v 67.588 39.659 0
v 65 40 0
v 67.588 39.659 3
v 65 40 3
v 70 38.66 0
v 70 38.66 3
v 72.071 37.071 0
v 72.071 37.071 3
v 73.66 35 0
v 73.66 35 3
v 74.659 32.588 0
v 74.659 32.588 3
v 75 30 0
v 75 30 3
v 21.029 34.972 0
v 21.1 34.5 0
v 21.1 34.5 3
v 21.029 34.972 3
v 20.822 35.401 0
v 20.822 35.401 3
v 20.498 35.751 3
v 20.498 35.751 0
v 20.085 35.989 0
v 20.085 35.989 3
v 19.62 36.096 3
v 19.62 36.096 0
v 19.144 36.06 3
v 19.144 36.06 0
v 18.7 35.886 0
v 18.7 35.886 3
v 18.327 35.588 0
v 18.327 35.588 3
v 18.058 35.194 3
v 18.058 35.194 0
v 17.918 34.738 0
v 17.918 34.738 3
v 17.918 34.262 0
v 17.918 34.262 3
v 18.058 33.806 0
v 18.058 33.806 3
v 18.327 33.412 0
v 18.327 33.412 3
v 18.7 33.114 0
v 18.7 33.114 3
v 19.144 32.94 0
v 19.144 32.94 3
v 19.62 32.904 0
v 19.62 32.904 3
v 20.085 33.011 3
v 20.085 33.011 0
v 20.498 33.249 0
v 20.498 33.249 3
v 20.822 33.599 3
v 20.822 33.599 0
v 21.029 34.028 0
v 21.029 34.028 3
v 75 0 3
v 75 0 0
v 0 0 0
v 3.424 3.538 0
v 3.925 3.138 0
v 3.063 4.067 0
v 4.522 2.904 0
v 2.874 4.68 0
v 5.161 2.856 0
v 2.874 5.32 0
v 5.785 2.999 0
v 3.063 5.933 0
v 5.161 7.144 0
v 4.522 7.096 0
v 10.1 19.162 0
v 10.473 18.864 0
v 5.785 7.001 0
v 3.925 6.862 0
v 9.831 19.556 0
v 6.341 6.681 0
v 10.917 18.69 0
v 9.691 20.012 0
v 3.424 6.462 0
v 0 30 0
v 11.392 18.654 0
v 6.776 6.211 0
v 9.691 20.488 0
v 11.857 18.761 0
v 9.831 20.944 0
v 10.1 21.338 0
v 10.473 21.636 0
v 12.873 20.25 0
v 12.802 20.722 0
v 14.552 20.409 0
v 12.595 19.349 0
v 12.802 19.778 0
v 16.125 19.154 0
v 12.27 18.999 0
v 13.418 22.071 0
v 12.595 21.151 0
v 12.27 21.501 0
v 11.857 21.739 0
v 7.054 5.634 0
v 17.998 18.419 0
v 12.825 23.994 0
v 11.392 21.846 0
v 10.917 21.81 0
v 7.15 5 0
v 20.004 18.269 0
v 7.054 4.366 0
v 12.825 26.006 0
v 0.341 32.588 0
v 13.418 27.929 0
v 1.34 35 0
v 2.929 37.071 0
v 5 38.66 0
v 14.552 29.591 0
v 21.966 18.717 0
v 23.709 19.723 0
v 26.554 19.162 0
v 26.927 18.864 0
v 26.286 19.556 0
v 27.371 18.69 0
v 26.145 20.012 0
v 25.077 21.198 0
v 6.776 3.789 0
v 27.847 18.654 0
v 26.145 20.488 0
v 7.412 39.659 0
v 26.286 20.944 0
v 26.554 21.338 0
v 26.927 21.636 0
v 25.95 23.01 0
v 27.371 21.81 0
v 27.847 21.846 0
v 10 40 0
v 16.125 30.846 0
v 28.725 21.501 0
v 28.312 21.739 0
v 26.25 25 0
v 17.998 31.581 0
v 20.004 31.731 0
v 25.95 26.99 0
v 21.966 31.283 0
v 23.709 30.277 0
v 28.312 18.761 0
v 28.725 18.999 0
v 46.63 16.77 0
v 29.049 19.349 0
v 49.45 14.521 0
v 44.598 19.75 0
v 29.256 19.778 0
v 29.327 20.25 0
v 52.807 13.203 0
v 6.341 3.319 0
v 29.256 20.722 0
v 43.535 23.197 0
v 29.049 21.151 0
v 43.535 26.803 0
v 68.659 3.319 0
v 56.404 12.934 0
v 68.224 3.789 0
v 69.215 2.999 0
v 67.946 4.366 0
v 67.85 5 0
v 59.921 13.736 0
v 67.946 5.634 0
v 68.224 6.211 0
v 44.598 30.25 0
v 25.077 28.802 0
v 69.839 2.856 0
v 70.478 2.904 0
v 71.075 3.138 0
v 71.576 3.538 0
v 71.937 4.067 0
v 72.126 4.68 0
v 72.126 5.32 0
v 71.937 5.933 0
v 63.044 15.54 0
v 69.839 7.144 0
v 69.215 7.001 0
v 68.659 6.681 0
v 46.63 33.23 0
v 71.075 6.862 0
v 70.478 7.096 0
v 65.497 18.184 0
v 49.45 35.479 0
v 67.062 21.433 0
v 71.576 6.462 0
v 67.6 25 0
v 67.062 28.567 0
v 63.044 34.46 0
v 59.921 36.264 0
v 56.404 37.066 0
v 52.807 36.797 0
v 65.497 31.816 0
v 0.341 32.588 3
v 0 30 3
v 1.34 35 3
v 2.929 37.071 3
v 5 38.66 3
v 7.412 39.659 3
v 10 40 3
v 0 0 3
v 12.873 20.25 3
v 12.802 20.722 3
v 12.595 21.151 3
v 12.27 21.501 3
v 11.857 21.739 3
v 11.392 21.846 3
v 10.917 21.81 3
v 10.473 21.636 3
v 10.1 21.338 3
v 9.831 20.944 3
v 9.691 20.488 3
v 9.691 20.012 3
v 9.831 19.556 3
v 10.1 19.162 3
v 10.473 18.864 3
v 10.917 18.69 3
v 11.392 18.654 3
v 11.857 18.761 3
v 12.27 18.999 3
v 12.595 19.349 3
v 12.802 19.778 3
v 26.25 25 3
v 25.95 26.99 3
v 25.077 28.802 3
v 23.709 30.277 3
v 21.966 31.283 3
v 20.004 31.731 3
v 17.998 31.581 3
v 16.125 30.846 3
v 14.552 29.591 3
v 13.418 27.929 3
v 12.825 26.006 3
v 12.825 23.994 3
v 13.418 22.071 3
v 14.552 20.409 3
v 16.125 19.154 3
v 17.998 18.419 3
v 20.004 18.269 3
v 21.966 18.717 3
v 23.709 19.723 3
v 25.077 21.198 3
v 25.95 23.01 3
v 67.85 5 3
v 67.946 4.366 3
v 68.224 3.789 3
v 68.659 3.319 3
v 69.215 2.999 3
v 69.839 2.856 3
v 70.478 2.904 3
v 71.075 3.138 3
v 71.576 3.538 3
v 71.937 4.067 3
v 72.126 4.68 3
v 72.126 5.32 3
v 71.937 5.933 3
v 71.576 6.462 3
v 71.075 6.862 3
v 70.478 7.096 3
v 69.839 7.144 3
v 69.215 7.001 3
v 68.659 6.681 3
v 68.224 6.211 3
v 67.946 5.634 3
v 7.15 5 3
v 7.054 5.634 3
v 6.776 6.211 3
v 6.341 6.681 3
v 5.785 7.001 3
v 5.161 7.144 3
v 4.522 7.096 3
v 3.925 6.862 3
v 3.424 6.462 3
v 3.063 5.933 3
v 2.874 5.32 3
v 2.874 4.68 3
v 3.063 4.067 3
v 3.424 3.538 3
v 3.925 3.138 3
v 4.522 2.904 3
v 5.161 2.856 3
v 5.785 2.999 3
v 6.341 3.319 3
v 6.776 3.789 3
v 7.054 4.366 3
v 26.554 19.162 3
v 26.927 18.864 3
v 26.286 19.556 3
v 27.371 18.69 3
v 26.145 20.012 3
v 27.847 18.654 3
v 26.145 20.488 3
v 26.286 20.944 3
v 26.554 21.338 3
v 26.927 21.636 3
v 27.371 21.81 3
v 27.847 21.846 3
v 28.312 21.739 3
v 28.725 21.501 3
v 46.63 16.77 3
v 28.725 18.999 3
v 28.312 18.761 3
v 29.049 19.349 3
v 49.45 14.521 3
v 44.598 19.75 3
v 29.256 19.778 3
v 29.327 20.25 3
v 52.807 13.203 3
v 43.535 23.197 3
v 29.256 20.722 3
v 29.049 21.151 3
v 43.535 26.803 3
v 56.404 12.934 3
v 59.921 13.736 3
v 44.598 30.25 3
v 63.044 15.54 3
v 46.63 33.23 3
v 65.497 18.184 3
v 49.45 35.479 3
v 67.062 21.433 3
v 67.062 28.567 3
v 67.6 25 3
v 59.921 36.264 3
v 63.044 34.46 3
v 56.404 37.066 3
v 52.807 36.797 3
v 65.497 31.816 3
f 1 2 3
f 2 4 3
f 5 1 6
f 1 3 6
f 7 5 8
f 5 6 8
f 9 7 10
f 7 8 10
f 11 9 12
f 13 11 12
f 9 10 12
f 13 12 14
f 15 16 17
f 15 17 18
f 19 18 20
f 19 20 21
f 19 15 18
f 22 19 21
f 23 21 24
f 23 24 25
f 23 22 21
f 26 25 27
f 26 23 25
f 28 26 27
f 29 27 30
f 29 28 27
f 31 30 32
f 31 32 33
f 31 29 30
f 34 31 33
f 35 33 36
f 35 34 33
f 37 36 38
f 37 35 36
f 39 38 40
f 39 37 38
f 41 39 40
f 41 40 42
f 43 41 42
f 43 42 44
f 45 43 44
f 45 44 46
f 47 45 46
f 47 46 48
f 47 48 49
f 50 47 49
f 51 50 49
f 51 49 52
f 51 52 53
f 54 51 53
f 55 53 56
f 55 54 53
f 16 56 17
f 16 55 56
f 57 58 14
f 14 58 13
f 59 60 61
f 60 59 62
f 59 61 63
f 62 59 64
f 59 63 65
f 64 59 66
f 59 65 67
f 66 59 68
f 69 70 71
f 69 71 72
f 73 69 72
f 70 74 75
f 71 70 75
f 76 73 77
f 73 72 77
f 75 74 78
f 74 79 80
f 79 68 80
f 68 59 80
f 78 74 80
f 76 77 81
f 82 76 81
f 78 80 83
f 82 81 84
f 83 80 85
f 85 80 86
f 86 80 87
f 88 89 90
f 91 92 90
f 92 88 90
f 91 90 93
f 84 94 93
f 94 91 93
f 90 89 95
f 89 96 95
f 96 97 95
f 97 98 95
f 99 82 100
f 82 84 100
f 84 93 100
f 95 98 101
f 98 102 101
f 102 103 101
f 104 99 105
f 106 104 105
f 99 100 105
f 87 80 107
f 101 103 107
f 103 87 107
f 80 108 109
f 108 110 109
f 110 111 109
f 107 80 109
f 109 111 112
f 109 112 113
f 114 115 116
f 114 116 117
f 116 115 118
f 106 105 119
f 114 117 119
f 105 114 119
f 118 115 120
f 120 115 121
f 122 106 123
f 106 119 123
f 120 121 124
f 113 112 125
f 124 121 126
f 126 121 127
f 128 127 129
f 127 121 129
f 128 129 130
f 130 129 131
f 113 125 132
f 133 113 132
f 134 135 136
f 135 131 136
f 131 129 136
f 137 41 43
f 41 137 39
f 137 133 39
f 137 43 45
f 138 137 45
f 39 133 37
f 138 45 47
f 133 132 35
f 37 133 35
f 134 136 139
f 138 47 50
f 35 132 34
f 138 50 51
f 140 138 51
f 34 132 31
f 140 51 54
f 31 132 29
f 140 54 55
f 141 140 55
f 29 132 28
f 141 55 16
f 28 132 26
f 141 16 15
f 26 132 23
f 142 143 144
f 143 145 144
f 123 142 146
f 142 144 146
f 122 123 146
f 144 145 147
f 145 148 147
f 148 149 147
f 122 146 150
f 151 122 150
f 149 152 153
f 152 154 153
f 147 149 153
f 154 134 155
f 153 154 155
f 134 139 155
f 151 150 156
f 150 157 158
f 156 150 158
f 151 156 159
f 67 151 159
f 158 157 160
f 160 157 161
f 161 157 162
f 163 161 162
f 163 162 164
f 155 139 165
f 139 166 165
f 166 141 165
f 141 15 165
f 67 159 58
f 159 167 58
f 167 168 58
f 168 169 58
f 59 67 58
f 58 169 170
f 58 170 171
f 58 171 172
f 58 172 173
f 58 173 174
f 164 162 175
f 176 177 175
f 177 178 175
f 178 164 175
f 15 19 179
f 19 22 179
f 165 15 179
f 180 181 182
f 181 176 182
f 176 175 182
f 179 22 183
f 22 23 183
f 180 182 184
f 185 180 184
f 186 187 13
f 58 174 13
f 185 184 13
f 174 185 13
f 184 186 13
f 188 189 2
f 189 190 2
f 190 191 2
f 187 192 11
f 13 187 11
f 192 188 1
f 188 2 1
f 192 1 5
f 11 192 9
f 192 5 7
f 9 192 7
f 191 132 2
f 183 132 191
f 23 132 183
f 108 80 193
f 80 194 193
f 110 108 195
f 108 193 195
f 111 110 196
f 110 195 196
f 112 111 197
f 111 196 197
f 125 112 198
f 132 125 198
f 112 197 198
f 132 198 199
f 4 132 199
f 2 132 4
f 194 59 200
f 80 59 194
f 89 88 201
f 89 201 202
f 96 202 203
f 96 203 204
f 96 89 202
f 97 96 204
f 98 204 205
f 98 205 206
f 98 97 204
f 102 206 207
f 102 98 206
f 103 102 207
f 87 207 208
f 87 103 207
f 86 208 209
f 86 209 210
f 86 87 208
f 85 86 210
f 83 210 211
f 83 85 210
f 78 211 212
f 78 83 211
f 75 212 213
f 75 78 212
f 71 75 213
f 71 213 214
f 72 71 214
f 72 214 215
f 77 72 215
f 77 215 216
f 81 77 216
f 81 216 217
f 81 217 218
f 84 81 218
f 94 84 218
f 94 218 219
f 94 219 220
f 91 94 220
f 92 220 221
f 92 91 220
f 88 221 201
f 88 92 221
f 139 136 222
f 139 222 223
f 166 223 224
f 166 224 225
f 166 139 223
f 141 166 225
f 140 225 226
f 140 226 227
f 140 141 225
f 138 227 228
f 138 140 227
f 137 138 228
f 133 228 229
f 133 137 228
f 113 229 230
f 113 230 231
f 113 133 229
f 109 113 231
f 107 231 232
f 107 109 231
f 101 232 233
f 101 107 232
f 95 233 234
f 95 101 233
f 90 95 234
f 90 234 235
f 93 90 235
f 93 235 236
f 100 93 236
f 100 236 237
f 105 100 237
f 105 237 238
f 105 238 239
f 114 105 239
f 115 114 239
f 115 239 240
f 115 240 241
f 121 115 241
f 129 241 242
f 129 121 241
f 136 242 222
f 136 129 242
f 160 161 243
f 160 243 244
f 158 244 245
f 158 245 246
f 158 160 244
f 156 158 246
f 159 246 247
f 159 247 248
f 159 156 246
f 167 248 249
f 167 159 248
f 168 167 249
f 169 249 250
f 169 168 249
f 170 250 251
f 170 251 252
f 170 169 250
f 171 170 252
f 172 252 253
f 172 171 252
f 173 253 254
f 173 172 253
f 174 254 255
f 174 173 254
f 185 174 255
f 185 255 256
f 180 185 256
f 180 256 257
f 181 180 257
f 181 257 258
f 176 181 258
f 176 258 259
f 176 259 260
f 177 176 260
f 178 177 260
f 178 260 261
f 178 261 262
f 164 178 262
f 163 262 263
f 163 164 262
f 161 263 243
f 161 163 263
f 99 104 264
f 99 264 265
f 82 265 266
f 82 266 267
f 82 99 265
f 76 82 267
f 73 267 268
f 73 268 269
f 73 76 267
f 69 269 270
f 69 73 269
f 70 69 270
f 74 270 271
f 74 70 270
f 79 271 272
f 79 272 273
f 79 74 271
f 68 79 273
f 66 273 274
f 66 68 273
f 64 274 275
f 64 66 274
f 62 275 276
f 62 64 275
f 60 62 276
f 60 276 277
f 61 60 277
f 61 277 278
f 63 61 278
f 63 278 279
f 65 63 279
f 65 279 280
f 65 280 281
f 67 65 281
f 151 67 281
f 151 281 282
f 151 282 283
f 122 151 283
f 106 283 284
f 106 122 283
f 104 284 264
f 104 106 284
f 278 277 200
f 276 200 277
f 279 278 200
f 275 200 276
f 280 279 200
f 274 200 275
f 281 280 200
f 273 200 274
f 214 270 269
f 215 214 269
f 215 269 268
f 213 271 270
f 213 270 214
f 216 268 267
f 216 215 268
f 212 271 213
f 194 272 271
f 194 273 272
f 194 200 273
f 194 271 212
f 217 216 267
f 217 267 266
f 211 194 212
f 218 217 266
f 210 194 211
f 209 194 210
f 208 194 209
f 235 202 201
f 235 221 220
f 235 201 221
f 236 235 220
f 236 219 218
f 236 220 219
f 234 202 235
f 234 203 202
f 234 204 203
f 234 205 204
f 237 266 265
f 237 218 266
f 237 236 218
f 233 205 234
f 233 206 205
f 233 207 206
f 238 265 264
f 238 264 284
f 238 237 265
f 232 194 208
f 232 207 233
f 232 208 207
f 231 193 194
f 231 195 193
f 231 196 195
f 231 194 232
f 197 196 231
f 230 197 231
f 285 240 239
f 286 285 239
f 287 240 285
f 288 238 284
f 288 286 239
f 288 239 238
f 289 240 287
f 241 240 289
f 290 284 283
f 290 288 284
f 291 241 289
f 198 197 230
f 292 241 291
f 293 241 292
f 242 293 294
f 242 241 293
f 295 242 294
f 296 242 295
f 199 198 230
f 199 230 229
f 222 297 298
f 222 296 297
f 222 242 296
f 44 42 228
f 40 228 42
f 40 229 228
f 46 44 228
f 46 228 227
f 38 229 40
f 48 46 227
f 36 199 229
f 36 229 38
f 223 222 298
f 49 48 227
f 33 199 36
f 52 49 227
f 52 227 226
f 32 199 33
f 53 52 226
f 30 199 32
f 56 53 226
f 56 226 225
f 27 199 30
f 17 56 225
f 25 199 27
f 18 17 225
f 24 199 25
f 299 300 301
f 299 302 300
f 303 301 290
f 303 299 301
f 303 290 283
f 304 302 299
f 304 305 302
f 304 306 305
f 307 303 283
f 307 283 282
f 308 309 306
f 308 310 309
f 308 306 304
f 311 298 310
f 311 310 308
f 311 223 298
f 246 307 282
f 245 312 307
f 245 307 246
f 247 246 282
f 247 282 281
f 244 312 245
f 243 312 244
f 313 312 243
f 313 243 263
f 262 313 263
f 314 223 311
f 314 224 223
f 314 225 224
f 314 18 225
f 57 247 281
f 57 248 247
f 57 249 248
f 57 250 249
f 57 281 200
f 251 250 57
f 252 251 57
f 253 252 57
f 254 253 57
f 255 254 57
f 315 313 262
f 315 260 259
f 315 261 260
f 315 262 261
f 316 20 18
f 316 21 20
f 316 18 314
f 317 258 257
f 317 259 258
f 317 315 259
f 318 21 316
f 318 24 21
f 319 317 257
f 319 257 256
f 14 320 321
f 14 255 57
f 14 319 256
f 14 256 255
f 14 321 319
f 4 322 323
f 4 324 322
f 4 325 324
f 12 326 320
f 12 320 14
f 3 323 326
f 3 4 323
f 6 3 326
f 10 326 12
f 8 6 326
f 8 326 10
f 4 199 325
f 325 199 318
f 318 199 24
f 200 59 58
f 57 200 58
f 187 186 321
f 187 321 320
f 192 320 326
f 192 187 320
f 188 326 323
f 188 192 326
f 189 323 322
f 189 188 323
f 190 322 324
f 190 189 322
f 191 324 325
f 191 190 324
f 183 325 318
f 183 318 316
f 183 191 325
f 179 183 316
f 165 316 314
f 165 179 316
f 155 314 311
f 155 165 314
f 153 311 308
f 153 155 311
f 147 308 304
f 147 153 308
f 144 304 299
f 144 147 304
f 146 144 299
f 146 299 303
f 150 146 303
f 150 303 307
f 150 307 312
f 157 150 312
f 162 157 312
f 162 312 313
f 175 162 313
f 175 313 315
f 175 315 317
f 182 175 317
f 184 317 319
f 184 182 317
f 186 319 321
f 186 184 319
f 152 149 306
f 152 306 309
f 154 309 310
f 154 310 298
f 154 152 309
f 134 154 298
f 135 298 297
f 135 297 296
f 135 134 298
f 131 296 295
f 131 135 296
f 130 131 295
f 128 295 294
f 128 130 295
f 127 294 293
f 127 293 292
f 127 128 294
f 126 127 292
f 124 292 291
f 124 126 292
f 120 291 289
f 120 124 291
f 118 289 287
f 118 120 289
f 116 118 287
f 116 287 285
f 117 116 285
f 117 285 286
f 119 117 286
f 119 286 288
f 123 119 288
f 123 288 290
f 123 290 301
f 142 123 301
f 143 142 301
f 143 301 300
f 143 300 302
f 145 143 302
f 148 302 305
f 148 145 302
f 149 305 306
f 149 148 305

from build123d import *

# Parameters (mm, degrees)
SKETCH_1_W      = 75
SKETCH_1_H      = 40
SKETCH_1_R      = 6.75
SKETCH_1_R_2    = 1.6
SKETCH_1_R_3    = 12.1
SKETCH_1_R_4    = 2.15
EXTRUDE_1_DEPTH = 3
FILLET_1_R      = 10


with BuildPart() as part:
    # ｽｹｯﾁ1 → ﾎﾞｽ - 押し出し1 (new body)
    with BuildSketch(Plane.XY):
        with Locations((37.5, 20)):
            Rectangle(SKETCH_1_W, SKETCH_1_H)
        with Locations((19.5, 25)):
            Circle(SKETCH_1_R, mode=Mode.SUBTRACT)
        with Locations((19.5, 34.5)):
            Circle(SKETCH_1_R_2, mode=Mode.SUBTRACT)
        with Locations((27.727241336, 20.25)):
            Circle(SKETCH_1_R_2, mode=Mode.SUBTRACT)
        with Locations((11.272758664, 20.25)):
            Circle(SKETCH_1_R_2, mode=Mode.SUBTRACT)
        with Locations((55.5, 25)):
            Circle(SKETCH_1_R_3, mode=Mode.SUBTRACT)
        with Locations((5, 5)):
            Circle(SKETCH_1_R_4, mode=Mode.SUBTRACT)
        with Locations(Location((70, 5, 0), (0, 0, 180))):
            Circle(SKETCH_1_R_4, mode=Mode.SUBTRACT)
    extrude(amount=EXTRUDE_1_DEPTH)

    # ﾌｨﾚｯﾄ1
    fillet_1_edges = [part.edges().sort_by_distance(p)[0] for p in [
        (0, 40, 1.5),
        (75, 40, 1.5),
    ]]
    fillet(fillet_1_edges, radius=FILLET_1_R)


solid = part.part
